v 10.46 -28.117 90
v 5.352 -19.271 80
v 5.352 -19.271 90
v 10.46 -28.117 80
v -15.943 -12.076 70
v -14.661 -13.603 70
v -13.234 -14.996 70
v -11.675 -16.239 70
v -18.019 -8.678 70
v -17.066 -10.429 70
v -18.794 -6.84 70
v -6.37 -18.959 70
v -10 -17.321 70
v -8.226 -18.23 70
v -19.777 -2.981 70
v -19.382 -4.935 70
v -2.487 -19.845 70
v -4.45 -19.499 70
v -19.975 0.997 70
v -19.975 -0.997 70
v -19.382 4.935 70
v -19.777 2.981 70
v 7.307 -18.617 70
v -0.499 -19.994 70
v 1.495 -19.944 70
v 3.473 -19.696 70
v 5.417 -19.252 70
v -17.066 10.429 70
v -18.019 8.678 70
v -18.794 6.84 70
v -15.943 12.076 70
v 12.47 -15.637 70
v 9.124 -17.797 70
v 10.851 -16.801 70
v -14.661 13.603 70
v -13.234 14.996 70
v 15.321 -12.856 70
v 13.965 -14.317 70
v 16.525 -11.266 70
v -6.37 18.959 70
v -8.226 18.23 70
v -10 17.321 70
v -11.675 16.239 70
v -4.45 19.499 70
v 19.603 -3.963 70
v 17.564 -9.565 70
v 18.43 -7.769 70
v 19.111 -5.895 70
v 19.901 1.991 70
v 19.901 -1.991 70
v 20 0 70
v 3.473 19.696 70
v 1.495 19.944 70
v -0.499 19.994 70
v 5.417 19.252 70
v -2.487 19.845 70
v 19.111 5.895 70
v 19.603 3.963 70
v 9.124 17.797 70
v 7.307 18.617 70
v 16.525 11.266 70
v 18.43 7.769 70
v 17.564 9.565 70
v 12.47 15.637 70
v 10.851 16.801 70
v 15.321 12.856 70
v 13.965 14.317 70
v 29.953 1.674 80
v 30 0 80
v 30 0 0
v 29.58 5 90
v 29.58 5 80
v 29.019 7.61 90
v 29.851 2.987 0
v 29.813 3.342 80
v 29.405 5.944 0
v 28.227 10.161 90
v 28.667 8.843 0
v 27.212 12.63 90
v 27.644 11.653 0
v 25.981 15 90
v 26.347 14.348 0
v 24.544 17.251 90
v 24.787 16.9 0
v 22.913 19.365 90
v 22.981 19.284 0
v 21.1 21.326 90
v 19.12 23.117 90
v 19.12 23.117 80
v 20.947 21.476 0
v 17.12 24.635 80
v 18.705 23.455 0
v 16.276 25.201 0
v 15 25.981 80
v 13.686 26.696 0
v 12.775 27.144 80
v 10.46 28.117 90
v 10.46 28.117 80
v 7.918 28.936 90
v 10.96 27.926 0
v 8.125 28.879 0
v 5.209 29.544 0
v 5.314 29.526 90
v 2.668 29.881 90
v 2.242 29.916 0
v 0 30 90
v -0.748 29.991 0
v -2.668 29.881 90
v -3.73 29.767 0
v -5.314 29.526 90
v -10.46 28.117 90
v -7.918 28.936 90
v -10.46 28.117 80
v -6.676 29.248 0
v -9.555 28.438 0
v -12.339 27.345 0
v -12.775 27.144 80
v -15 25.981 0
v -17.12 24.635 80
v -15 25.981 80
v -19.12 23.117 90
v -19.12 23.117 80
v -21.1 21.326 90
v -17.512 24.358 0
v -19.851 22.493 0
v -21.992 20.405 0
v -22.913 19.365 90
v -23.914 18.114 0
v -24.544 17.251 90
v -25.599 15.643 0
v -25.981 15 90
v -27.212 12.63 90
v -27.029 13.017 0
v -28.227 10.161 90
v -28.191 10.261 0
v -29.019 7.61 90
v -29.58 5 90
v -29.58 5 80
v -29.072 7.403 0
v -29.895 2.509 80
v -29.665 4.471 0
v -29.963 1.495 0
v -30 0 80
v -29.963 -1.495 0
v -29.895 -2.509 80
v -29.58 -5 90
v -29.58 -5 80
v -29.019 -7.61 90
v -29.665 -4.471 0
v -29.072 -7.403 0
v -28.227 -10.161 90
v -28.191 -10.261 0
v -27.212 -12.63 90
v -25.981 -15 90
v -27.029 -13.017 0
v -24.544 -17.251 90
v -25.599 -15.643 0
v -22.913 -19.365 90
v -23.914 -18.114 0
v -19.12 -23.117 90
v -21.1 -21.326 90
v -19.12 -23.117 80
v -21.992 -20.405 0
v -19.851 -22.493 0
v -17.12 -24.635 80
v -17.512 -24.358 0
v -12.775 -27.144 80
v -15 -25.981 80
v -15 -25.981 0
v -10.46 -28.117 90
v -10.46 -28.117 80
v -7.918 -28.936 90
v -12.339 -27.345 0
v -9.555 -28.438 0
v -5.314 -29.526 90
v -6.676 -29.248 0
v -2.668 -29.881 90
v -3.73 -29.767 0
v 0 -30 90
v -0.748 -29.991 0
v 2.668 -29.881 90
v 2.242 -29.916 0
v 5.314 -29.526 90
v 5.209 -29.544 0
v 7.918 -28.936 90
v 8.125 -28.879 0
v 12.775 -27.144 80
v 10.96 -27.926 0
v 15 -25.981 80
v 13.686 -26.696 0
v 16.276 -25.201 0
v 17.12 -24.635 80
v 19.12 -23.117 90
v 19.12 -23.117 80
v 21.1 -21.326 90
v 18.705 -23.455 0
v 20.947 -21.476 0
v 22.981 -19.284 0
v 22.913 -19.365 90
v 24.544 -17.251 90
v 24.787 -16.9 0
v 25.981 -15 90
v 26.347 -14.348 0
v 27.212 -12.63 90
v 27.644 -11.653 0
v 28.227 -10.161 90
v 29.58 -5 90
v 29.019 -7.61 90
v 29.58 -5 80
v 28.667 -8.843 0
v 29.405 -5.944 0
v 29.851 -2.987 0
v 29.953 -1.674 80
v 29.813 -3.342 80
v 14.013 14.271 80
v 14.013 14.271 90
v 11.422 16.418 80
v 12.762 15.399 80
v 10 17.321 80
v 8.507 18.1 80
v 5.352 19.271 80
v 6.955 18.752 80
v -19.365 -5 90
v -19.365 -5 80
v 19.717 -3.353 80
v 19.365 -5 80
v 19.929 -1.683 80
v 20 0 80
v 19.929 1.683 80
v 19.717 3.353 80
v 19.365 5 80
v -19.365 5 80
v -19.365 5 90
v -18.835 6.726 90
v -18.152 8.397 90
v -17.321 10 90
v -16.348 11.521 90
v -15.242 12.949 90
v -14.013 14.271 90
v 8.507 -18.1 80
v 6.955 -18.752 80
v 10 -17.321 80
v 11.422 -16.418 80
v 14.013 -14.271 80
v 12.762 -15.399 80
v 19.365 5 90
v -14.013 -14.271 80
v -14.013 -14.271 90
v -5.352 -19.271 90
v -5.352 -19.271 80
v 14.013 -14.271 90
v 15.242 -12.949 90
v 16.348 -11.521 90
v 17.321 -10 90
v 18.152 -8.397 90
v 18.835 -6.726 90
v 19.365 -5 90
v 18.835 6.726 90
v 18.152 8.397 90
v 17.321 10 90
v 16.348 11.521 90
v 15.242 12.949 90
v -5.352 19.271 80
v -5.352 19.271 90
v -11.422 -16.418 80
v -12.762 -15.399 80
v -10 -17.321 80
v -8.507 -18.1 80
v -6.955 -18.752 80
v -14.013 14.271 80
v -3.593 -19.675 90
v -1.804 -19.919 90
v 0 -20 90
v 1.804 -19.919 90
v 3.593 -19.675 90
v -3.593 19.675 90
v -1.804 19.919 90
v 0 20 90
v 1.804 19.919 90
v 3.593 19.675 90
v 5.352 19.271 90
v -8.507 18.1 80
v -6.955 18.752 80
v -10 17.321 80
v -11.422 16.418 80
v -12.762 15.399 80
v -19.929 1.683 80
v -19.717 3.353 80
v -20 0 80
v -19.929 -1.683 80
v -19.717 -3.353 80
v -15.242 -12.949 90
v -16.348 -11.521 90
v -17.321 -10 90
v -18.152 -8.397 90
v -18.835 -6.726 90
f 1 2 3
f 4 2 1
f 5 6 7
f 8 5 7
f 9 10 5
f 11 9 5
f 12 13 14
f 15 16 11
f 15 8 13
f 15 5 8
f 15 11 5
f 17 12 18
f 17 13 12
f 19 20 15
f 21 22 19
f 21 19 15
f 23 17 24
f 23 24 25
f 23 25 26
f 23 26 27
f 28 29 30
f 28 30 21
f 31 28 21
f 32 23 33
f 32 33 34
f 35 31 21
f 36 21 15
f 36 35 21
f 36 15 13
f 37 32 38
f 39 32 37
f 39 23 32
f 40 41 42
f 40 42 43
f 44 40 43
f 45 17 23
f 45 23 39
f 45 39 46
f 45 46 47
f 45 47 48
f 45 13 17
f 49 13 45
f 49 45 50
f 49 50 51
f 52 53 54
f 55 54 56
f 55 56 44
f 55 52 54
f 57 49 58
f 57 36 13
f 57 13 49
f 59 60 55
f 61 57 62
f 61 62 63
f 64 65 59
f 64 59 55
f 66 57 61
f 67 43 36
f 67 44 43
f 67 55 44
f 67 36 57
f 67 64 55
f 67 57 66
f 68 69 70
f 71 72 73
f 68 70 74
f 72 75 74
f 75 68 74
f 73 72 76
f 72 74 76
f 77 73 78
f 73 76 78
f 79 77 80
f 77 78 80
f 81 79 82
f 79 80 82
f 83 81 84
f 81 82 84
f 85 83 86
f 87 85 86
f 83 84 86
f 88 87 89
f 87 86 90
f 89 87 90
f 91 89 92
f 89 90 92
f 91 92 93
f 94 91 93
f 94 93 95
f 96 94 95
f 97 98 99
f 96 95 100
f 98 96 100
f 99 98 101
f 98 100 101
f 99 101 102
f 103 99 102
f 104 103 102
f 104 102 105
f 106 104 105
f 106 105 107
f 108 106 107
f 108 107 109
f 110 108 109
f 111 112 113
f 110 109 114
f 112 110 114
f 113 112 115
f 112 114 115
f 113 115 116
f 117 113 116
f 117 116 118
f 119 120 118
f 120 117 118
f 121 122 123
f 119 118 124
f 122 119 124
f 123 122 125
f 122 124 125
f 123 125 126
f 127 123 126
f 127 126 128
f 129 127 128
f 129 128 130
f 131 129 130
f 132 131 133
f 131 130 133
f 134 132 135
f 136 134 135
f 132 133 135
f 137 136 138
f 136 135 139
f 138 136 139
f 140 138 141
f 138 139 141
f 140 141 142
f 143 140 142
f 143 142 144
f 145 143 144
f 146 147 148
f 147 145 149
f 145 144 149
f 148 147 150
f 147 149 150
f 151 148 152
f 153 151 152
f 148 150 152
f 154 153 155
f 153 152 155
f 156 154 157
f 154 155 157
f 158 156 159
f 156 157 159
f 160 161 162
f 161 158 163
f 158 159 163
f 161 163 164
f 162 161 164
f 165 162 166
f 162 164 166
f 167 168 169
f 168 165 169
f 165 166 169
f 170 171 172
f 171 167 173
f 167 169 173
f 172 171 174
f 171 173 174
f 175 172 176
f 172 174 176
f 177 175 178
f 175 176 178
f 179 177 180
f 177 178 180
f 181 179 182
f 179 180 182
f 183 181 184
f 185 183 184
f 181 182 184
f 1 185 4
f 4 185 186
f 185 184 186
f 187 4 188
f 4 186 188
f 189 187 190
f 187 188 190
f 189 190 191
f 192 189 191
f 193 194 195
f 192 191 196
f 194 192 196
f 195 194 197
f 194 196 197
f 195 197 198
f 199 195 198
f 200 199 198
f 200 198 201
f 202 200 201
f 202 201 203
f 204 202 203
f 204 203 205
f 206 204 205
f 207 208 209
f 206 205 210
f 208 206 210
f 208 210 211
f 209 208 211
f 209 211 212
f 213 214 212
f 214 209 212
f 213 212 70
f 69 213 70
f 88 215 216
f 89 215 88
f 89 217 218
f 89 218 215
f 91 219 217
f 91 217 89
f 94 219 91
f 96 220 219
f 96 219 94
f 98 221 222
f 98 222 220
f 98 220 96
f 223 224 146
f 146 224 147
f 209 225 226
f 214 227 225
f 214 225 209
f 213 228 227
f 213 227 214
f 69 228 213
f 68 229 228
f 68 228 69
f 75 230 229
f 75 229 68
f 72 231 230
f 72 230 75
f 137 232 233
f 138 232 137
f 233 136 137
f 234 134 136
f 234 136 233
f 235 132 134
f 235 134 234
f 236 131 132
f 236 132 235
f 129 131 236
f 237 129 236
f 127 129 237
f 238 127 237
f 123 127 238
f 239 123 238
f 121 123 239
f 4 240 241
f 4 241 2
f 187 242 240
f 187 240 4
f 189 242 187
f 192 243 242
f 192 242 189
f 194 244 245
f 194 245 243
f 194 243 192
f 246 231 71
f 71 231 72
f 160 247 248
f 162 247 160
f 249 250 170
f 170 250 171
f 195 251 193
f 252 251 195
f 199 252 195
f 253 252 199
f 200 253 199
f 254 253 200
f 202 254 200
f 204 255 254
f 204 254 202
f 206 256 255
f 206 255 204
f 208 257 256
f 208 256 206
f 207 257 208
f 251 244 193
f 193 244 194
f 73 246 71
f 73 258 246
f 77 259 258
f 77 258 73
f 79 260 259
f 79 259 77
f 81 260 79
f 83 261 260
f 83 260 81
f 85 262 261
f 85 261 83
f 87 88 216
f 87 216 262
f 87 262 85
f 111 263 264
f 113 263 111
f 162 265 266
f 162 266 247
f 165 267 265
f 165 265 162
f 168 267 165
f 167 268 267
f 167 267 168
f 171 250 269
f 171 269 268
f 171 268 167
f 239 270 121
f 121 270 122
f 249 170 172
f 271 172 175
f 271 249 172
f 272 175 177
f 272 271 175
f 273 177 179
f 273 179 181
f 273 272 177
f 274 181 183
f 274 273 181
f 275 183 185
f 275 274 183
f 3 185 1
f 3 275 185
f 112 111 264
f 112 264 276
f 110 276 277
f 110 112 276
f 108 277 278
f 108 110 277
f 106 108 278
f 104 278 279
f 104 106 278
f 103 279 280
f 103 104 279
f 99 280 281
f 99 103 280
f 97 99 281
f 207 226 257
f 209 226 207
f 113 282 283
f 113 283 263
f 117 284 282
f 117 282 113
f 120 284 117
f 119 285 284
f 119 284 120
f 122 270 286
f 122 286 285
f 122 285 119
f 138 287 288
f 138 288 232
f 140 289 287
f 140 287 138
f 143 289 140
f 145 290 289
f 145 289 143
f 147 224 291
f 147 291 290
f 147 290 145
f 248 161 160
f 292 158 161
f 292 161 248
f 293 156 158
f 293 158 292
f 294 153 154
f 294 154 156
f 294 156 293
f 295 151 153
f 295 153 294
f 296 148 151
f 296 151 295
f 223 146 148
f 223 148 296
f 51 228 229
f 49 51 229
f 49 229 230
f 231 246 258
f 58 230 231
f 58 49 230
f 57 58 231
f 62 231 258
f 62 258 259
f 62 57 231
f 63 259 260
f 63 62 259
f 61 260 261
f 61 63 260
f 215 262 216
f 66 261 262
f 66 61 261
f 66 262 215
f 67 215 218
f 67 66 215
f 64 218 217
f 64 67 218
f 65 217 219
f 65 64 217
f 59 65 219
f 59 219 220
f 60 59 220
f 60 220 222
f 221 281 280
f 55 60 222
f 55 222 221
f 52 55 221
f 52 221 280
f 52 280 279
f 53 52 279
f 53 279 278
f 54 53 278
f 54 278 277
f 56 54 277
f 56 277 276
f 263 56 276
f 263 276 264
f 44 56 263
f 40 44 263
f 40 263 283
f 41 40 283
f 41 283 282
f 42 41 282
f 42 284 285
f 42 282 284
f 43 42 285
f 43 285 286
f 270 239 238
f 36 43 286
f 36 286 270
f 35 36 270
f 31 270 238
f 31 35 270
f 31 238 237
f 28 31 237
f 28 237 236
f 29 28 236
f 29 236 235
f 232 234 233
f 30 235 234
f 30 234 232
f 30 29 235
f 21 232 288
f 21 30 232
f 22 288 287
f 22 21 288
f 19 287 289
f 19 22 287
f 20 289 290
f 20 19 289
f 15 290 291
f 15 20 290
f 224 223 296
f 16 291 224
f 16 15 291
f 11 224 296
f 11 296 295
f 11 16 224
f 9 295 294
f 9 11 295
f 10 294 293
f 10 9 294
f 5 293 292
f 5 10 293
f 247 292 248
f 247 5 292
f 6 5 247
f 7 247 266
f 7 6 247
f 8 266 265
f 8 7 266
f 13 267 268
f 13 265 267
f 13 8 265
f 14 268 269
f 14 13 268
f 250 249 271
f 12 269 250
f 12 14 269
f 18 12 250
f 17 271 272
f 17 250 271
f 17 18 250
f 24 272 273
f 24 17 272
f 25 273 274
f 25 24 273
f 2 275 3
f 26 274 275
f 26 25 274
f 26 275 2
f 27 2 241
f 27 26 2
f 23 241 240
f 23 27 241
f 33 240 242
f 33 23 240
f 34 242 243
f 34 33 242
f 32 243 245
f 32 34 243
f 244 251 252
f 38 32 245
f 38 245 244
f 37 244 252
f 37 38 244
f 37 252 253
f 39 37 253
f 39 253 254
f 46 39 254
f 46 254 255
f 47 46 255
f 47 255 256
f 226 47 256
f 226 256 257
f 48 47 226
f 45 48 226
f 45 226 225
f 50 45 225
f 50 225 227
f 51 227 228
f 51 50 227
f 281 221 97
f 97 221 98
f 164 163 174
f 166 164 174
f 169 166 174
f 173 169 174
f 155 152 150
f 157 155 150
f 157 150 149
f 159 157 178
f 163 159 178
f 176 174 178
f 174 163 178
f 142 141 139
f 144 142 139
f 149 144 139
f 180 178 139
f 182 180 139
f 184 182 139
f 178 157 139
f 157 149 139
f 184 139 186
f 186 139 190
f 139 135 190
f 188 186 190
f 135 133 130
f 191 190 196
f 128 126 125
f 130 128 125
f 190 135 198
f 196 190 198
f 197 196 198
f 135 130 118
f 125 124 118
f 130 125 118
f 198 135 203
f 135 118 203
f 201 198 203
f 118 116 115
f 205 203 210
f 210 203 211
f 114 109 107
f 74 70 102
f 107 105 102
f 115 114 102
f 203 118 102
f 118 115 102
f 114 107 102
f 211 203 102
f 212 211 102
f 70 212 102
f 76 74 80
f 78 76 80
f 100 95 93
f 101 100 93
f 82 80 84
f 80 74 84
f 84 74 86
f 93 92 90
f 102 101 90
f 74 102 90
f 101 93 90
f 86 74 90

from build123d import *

# Parameters (mm, degrees)
BOX_W             = 20
BOX_H             = 10
BOX_DEPTH         = 10
ARRAY_COUNT       = 6
CYLINDER001_R     = 20
CYLINDER001_DEPTH = 20
CYLINDER_R        = 30
CYLINDER_DEPTH    = 90


with BuildPart() as array_almenas:
    # Box → Box (new body)
    with BuildSketch(Plane(origin=(15, -5, 80), x_dir=(1, 0, 0), z_dir=(0, 0, 1))):
        with Locations((10, 5)):
            Rectangle(BOX_W, BOX_H)
    extrude(amount=BOX_DEPTH)

    # Array: Array_almenas ×6 about axis
    array_axis = Axis((0, 0, 0), (0, 0, 1))


with BuildPart() as array_almenas_1:
    add(array_almenas.part)
    for i in range(1, ARRAY_COUNT):
        add(array_almenas.part.rotate(array_axis, i * 360 / ARRAY_COUNT))


with BuildPart() as vaciadotorre:
    # Cylinder001 → Cylinder001 (new body)
    with BuildSketch(Plane.XY.offset(70)):
        Circle(CYLINDER001_R)
    extrude(amount=CYLINDER001_DEPTH)


with BuildPart() as torre_acabada:
    # Cylinder → Cylinder (new body)
    with BuildSketch(Plane.XY):
        Circle(CYLINDER_R)
    extrude(amount=CYLINDER_DEPTH)

    # Cut: cut VaciadoTorre
    add(vaciadotorre.part, mode=Mode.SUBTRACT)

    # Cut001: cut Array_almenas
    add(array_almenas_1.part, mode=Mode.SUBTRACT)


solid = torre_acabada.part
